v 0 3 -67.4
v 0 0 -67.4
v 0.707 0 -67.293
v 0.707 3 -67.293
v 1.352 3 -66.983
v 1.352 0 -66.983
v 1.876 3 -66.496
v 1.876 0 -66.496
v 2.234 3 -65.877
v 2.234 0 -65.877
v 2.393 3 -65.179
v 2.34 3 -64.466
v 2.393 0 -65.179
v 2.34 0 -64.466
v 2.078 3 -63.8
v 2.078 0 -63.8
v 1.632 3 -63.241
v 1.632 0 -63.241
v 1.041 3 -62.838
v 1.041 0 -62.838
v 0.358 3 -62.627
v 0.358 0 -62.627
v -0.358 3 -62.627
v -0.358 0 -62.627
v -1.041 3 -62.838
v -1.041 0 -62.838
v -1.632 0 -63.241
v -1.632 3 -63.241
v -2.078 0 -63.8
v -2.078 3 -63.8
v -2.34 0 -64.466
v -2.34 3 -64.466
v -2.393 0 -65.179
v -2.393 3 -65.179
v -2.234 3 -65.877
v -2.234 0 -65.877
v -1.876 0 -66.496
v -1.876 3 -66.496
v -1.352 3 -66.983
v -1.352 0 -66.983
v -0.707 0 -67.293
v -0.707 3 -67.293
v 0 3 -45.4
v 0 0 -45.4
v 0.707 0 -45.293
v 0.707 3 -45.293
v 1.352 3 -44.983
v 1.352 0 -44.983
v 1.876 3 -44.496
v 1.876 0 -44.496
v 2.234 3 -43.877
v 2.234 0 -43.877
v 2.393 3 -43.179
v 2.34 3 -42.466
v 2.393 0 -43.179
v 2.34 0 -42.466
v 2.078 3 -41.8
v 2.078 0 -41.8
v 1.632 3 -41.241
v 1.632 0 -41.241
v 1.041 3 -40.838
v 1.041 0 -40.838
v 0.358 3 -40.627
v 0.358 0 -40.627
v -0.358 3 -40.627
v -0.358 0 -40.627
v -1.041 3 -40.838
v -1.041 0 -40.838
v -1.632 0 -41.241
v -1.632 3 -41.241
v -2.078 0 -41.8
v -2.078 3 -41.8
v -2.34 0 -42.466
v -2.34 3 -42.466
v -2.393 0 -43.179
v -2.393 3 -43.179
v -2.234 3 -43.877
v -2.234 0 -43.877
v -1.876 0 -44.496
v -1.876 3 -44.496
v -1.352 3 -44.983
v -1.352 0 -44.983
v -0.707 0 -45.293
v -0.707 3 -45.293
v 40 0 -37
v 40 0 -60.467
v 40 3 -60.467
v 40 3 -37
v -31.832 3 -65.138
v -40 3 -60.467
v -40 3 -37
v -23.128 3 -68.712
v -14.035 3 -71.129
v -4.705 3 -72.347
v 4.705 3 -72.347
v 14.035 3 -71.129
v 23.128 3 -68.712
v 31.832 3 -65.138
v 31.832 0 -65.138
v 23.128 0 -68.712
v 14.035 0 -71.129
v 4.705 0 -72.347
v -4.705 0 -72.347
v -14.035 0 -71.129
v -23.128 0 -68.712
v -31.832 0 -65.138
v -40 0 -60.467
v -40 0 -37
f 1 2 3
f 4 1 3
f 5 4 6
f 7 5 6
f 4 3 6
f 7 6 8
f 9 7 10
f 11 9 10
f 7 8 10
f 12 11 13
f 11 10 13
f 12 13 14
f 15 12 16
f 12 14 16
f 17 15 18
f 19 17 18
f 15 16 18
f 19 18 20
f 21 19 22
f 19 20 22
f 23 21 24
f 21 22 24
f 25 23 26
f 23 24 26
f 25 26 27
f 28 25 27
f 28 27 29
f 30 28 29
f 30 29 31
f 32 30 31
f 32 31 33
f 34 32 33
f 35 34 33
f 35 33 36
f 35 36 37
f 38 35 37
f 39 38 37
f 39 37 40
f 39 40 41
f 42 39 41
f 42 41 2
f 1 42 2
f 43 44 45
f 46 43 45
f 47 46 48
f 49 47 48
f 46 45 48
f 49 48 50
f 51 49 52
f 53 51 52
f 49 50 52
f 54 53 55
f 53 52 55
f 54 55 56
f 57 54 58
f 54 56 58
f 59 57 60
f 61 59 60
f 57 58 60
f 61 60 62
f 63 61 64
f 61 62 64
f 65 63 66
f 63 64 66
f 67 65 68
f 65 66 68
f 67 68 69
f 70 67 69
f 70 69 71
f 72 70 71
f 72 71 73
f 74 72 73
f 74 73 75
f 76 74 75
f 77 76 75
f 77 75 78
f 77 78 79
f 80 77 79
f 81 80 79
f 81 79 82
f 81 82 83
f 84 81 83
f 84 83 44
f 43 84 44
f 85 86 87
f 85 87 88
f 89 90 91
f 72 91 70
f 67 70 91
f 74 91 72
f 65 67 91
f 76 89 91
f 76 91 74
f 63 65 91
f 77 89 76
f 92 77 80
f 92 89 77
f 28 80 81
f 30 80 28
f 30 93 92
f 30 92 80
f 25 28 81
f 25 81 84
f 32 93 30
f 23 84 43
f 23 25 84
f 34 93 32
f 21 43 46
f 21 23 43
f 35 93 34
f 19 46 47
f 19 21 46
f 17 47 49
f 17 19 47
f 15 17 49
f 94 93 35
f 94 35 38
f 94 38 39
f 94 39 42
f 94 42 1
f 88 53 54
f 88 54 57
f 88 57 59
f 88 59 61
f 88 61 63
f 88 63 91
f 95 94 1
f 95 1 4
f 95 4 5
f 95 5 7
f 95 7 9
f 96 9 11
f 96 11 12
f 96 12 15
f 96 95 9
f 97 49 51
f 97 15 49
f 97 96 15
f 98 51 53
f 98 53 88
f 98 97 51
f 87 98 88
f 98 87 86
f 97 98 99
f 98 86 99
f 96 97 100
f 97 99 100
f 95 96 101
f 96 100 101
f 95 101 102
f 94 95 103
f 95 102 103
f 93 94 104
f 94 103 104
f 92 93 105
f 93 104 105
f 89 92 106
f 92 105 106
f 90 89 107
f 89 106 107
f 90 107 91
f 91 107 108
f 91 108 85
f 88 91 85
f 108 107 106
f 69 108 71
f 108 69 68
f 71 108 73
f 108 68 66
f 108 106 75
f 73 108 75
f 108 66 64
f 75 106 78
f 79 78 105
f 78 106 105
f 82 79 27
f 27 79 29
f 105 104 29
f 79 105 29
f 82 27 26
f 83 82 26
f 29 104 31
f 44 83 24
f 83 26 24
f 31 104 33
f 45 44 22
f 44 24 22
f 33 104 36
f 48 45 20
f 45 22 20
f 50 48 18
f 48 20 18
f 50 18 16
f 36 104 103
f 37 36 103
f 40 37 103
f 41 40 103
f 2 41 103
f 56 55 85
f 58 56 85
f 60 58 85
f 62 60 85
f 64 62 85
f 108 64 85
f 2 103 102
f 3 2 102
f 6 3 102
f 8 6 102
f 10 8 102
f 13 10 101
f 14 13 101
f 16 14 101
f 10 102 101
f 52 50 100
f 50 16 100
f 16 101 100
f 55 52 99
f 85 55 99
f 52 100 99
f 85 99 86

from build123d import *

# Parameters (mm, degrees)
BOSS_EXTRUDE1_DEPTH  = 3
SKETCH11_OUTSIDE_W   = 186.736
SKETCH11_OUTSIDE_H   = 177.534
SKETCH11_OUTSIDE_W_2 = 80
SKETCH11_OUTSIDE_H_2 = 40
CUT_EXTRUDE13_DEPTH  = 103.574363269
SKETCH12_R           = 2.4
CUT_EXTRUDE15_DEPTH  = 83.856804186


with BuildPart() as part:
    # Sketch1 → Boss-Extrude1 (new body)
    with BuildSketch(Plane(origin=(0, 0, 0), x_dir=(1, 0, 0), z_dir=(0, 1, 0))):
        with BuildLine():
            ThreePointArc((36.543377003, -62.616544118), (0, 72.5), (-36.543377003, -62.616544118))
            ThreePointArc((-36.543377003, -62.616544118), (-33.085954668, -63.20954405), (-30.089832649, -61.38507948))
            ThreePointArc((-30.089832649, -61.38507948), (0, -46.75), (30.089832649, -61.38507948))
            ThreePointArc((30.089832649, -61.38507948), (33.085954668, -63.20954405), (36.543377003, -62.616544118))
        make_face()
    extrude(amount=BOSS_EXTRUDE1_DEPTH)

    # Sketch11 outside → Cut-Extrude13 (cut, through all)
    with BuildSketch(Plane.XZ):
        with Locations((0, -4.601)):
            Rectangle(SKETCH11_OUTSIDE_W, SKETCH11_OUTSIDE_H)
        with Locations((0, -57)):
            Rectangle(SKETCH11_OUTSIDE_W_2, SKETCH11_OUTSIDE_H_2, mode=Mode.SUBTRACT)
    extrude(amount=-CUT_EXTRUDE13_DEPTH, mode=Mode.SUBTRACT)

    # Sketch12 → Cut-Extrude15 (cut, through all)
    with BuildSketch(Plane.XZ):
        with Locations(Location((0, -65, 0), (0, 0, 270))):
            Circle(SKETCH12_R)
        with Locations(Location((0, -43, 0), (0, 0, 270))):
            Circle(SKETCH12_R)
    extrude(amount=-CUT_EXTRUDE15_DEPTH, mode=Mode.SUBTRACT)


solid = part.part
